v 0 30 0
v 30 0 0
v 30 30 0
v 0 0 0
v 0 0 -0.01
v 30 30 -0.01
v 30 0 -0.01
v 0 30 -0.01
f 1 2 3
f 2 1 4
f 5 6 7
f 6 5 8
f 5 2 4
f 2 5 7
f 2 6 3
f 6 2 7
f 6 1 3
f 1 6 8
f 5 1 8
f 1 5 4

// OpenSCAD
translate([0,0,-0.01]) color([0.1,0.1,0.1]) cube([30,30,0.01]);
